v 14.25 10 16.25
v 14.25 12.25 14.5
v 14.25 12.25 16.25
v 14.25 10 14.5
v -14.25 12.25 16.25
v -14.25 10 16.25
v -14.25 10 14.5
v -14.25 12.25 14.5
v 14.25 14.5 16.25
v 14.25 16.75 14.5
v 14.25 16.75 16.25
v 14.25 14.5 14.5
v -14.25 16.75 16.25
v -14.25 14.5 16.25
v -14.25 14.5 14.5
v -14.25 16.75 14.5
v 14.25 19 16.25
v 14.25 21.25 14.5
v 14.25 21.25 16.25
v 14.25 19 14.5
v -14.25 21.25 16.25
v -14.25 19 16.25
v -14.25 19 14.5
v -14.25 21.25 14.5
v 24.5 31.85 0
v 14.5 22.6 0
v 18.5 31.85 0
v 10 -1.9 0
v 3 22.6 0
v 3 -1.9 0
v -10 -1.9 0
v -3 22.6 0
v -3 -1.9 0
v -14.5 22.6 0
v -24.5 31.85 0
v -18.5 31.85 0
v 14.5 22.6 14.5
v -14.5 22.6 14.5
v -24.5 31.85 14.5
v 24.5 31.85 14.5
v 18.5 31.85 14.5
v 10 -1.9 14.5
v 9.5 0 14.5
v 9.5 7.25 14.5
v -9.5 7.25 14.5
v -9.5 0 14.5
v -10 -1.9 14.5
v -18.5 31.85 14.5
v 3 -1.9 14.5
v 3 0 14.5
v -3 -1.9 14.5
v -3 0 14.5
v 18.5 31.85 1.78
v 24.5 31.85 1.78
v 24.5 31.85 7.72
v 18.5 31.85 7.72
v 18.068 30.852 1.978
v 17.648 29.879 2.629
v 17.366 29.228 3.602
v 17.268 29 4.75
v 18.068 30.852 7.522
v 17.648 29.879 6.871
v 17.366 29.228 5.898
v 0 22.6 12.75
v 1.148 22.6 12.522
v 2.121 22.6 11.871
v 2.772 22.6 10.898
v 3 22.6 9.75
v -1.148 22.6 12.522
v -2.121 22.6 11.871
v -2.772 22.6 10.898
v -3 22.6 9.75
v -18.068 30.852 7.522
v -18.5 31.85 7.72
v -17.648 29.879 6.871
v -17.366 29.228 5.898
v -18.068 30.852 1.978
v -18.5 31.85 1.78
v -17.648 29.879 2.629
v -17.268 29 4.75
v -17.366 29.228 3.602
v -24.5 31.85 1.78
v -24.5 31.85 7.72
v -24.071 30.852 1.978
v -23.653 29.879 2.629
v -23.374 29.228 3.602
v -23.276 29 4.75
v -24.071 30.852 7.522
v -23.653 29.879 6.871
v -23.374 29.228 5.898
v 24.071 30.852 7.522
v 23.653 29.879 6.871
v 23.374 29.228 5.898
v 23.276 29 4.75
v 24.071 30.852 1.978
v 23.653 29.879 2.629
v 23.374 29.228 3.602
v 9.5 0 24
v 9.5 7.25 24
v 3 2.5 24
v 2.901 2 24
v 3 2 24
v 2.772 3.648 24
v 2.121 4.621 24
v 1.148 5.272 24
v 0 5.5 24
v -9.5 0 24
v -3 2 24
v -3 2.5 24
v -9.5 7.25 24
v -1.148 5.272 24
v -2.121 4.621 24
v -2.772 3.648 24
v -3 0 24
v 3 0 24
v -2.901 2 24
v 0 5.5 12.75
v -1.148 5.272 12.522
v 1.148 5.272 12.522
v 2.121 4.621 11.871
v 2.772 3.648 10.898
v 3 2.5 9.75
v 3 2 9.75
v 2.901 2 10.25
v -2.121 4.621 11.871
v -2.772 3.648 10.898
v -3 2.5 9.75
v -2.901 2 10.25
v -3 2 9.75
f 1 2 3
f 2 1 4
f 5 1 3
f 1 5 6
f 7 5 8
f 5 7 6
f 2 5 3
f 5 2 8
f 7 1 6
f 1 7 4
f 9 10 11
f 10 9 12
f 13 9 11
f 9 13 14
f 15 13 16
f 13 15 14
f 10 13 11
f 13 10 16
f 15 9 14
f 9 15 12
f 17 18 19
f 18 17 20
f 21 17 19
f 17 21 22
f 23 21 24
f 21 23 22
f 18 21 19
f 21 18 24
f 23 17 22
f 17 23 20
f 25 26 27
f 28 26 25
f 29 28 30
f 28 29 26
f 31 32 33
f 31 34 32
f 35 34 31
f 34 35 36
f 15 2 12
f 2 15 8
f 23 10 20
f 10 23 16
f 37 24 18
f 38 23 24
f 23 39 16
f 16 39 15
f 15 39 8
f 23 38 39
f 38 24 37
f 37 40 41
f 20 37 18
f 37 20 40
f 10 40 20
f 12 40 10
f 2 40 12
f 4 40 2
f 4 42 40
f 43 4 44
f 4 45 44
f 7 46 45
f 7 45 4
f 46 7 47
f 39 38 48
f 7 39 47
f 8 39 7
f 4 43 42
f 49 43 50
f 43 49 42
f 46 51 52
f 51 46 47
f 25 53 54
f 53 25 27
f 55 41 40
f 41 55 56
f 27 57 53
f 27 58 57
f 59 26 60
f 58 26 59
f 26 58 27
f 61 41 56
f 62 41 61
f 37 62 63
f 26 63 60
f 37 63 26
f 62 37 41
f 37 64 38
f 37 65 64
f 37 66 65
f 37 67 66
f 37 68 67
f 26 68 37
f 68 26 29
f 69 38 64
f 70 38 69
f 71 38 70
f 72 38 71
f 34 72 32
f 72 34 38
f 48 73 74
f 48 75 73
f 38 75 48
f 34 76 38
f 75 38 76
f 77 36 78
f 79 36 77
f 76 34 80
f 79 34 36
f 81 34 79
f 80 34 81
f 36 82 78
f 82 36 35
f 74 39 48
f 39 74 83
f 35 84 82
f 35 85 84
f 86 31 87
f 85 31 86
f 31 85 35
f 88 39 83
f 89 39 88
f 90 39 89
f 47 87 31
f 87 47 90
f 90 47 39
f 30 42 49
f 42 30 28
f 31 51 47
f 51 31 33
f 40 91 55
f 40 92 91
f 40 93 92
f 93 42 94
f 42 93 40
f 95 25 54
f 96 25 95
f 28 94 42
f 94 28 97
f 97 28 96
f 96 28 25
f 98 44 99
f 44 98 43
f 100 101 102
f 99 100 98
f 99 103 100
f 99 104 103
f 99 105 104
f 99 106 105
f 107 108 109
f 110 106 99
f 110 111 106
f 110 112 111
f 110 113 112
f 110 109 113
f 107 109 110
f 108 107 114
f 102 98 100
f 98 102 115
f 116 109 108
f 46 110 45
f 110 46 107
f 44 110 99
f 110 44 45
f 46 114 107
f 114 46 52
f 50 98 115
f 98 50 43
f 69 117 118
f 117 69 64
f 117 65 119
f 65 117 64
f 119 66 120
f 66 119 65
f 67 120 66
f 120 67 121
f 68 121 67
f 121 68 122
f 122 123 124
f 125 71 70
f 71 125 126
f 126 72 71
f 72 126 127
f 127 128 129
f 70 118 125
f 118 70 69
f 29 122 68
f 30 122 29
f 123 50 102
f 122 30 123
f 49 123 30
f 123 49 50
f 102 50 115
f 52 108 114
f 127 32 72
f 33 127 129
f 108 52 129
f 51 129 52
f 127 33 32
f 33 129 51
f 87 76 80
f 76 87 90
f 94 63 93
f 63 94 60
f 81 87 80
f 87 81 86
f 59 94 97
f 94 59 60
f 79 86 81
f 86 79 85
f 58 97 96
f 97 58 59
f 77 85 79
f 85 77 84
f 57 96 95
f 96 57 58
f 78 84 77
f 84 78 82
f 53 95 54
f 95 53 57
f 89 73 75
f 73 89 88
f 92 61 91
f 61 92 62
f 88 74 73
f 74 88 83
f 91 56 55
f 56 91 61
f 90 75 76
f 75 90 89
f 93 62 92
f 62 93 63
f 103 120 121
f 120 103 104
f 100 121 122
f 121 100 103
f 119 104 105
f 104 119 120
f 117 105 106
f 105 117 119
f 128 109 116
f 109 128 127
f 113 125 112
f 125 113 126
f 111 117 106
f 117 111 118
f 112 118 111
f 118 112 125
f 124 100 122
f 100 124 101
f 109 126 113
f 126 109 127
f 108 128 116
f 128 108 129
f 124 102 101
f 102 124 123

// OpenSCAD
// dishasher part 2

r=2.5;	// radius of bars
h=37-r-2.25;	// height of triangle
h2=5;	// dent in bottom
h3=12;
h4=23;
h5=32;	// height of top bar bottom
h6=-1.5;	// height at bottom of extension
w=34; wh=w/2; // inside of top of triangle
w2=49; w2h=w2/2;	// top of triangle
w3=20; w3h=w3/2; // width of bottom of triangle
w4=29; w4h=w4/2; // width of gap at top
w5=w2-12; w5h=w5/2; // width at top of gap
tab=10;
g=0.5;


t=2.25; // thickness of base
t2=10.75; // top of bar

$fn=16;

baset = 2*t+4*r;
echo(baset);

p=[[w3h,h6],[w2h,h],[w5h,h],[w4h,h4],
	[-w4h,h4],[-w5h,h],[-w2h,h],[-w3h,h6]];

echo(p);

difference() {
	union() {
		translate([0,-0.4,0]) linear_extrude(height=baset) {
			polygon(points=p, paths=[[0,1,2,3,4,5,6,7,0]]);
			}
		translate([-2*(r+t),0,baset-g]) cube([4*(r+t),h2+t,tab]);
		for (y = [10:2*t:10+4*t]) {
			translate([-3*(r+t),y,baset-g]) cube([6*(r+t),t,t]);
			}
		}
	// vertical slot
	translate([0,0,baset-t-r]) rotate([-90,0,0]) translate([0,0,h6-g]) 
		{
		cylinder(r=r+g, h=h);
		translate([-(r+g),0,0]) cube([2*(r+g),4*r,h]);
		}
	// slot across top
	translate([-w, h5, r+t]) rotate([0,90,0]) {
		cylinder(r=r+g,h=2*w);
		translate([-r,0,0]) cube([2*r,2*r+g,2*w]);
		}
	// horizontal bar
	translate([0,h2-r,t]) cylinder(r=r+g, h=h);
	translate([-(r+g),h6-g,t]) cube([2*(r+g),r-h6,h]);
	}
